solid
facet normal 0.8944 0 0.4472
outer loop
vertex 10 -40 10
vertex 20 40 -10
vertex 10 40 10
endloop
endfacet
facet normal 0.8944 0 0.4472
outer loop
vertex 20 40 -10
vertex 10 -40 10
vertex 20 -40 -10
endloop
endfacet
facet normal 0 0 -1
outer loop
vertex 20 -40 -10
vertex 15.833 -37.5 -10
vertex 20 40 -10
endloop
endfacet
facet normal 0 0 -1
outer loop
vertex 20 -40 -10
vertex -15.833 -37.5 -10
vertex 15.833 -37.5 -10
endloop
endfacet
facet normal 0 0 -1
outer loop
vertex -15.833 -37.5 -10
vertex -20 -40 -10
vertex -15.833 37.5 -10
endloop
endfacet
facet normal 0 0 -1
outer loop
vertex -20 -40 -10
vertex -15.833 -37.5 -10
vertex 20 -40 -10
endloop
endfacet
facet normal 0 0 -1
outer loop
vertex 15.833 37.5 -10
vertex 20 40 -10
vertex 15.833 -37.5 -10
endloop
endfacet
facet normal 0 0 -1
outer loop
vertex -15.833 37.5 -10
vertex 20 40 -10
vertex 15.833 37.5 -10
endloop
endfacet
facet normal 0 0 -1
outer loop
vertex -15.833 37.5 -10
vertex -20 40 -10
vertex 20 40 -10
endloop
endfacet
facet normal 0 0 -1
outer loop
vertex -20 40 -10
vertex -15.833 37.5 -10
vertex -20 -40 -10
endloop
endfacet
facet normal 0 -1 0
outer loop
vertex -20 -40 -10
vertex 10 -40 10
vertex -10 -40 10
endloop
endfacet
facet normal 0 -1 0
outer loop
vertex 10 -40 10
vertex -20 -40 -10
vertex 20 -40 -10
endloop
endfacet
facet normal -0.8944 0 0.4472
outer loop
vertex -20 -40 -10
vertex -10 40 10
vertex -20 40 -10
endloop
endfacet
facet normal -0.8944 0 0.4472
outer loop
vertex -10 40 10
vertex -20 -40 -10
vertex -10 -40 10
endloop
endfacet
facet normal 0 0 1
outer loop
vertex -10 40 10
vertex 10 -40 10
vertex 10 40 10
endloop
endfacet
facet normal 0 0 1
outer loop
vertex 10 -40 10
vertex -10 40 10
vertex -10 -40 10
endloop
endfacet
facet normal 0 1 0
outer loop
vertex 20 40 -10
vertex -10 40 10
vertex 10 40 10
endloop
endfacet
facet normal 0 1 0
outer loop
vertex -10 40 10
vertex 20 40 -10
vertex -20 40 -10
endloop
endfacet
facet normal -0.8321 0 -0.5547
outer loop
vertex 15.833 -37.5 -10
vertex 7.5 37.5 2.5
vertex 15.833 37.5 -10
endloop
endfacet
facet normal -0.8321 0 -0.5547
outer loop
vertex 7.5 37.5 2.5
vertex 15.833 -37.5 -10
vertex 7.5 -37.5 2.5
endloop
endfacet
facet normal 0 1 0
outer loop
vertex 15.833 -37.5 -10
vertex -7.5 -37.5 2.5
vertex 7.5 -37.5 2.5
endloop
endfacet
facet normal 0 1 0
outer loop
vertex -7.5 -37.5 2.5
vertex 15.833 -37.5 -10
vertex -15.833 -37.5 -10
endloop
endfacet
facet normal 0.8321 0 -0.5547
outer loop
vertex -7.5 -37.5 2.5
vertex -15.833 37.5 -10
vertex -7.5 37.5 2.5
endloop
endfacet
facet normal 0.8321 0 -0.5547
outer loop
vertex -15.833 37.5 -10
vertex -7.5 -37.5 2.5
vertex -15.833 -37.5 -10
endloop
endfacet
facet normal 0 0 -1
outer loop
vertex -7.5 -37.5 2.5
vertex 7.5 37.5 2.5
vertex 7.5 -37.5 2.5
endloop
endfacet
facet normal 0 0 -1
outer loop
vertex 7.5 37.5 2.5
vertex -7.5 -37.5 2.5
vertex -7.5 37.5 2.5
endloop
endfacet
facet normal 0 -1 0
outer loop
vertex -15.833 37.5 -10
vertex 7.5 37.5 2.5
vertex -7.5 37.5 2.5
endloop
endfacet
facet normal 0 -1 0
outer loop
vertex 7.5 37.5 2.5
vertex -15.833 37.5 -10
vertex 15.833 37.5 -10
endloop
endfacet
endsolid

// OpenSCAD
module banera(B = 40, b = 20, h = 20, height = 80) {
    color ("brown")
    rotate([90, 0, 0])
    linear_extrude(height, center = true)
    polygon ( points = [
                [-B/2, -h/2],
                [-b/2, h/2],
                [b/2, h/2],
                [B/2, -h/2]]);
}

difference() {
    banera();
    translate([0,0,-5]) banera(35, 15, 15, 75);
}
